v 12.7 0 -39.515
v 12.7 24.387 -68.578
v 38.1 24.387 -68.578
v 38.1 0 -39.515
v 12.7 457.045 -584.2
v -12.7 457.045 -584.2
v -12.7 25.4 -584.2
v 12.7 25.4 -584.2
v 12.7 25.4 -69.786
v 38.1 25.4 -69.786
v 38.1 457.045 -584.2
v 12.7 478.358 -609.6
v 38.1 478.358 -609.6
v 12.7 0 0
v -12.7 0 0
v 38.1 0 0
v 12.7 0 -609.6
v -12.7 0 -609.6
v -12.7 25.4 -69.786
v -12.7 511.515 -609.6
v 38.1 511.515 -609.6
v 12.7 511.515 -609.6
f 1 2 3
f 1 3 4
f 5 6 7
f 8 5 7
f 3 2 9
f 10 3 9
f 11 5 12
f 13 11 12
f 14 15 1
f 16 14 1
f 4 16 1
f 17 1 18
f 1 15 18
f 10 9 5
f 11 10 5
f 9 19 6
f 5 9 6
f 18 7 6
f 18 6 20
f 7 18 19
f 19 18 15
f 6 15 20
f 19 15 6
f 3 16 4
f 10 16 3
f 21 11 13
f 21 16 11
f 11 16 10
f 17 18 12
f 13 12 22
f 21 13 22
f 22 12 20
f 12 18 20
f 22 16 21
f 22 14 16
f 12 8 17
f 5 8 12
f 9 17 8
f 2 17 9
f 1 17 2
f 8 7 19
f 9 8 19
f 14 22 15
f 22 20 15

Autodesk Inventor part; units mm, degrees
ref_plane "YZ Plane" through (0, 0, 0) normal (1, 0, 0) x (0, 1, 0)
ref_plane "XZ Plane" through (0, 0, 0) normal (0, 1, 0) x (-1, 0, 0)
sketch "Sketch1" plane through (0, 0, 0) normal (1, 0, 0) x (0, 1, 0)
  line L0 (0, 0) -> (0, -609.6)
  line L1 (0, -609.6) -> (511.5151, -609.6)
  line L2 (511.5151, -609.6) -> (0, 0)
  line L3 (25.4, -69.7859) -> (457.0447, -584.2)
  line L4 (457.0447, -584.2) -> (25.4, -584.2)
  line L5 (25.4, -584.2) -> (25.4, -69.7859)
  dimension "d0" = 609.6
  dimension "d1" = 40
  dimension "d2" = 25.4
  dimension "d3" = 25.4
  dimension "d4" = 25.4
extrude "Extrusion1" add sketch "Sketch1" along normal mid plane 25.4
sketch "Sketch2" plane through (12.7, 0, 0) normal (1, 0, 0) x (0, 0, -1)
  line L0 (0, 0) -> (609.6, 0) projected
  line L1 (0, 0) -> (610.7413, 512.4728)
  line L2 (69.7859, 25.4) -> (584.2, 457.0447) projected
  line L3 (68.5783, 24.3867) -> (584.2, 457.0447)
  line L4 (584.2, 457.0447) -> (609.6, 478.3578)
  line L5 (584.2, 25.4) -> (69.7859, 25.4) projected
  line L6 (69.7859, 25.4) -> (39.5154, 0)
  line L7 (39.5154, 0) -> (0, 0)
  line L8 (609.6, 0) -> (609.6, 511.5151) projected
  line L9 (609.6, 511.5151) -> (609.6, 478.3578)
  point P0 (609.6, 511.5151)
  point P1 (69.7859, 25.4)
extrude "Extrusion2" add sketch "Sketch2" along normal blind 25.4 contours L1 L8 L4 L2 L3 L6 L0
ref_plane "planeForCenterLineOfPowerCells" through (-12.7, 68.1014, 57.1438) normal (0, 0.766, 0.6428) x (1, 0, 0)
properties part number "ballRampLeftSideV04"
